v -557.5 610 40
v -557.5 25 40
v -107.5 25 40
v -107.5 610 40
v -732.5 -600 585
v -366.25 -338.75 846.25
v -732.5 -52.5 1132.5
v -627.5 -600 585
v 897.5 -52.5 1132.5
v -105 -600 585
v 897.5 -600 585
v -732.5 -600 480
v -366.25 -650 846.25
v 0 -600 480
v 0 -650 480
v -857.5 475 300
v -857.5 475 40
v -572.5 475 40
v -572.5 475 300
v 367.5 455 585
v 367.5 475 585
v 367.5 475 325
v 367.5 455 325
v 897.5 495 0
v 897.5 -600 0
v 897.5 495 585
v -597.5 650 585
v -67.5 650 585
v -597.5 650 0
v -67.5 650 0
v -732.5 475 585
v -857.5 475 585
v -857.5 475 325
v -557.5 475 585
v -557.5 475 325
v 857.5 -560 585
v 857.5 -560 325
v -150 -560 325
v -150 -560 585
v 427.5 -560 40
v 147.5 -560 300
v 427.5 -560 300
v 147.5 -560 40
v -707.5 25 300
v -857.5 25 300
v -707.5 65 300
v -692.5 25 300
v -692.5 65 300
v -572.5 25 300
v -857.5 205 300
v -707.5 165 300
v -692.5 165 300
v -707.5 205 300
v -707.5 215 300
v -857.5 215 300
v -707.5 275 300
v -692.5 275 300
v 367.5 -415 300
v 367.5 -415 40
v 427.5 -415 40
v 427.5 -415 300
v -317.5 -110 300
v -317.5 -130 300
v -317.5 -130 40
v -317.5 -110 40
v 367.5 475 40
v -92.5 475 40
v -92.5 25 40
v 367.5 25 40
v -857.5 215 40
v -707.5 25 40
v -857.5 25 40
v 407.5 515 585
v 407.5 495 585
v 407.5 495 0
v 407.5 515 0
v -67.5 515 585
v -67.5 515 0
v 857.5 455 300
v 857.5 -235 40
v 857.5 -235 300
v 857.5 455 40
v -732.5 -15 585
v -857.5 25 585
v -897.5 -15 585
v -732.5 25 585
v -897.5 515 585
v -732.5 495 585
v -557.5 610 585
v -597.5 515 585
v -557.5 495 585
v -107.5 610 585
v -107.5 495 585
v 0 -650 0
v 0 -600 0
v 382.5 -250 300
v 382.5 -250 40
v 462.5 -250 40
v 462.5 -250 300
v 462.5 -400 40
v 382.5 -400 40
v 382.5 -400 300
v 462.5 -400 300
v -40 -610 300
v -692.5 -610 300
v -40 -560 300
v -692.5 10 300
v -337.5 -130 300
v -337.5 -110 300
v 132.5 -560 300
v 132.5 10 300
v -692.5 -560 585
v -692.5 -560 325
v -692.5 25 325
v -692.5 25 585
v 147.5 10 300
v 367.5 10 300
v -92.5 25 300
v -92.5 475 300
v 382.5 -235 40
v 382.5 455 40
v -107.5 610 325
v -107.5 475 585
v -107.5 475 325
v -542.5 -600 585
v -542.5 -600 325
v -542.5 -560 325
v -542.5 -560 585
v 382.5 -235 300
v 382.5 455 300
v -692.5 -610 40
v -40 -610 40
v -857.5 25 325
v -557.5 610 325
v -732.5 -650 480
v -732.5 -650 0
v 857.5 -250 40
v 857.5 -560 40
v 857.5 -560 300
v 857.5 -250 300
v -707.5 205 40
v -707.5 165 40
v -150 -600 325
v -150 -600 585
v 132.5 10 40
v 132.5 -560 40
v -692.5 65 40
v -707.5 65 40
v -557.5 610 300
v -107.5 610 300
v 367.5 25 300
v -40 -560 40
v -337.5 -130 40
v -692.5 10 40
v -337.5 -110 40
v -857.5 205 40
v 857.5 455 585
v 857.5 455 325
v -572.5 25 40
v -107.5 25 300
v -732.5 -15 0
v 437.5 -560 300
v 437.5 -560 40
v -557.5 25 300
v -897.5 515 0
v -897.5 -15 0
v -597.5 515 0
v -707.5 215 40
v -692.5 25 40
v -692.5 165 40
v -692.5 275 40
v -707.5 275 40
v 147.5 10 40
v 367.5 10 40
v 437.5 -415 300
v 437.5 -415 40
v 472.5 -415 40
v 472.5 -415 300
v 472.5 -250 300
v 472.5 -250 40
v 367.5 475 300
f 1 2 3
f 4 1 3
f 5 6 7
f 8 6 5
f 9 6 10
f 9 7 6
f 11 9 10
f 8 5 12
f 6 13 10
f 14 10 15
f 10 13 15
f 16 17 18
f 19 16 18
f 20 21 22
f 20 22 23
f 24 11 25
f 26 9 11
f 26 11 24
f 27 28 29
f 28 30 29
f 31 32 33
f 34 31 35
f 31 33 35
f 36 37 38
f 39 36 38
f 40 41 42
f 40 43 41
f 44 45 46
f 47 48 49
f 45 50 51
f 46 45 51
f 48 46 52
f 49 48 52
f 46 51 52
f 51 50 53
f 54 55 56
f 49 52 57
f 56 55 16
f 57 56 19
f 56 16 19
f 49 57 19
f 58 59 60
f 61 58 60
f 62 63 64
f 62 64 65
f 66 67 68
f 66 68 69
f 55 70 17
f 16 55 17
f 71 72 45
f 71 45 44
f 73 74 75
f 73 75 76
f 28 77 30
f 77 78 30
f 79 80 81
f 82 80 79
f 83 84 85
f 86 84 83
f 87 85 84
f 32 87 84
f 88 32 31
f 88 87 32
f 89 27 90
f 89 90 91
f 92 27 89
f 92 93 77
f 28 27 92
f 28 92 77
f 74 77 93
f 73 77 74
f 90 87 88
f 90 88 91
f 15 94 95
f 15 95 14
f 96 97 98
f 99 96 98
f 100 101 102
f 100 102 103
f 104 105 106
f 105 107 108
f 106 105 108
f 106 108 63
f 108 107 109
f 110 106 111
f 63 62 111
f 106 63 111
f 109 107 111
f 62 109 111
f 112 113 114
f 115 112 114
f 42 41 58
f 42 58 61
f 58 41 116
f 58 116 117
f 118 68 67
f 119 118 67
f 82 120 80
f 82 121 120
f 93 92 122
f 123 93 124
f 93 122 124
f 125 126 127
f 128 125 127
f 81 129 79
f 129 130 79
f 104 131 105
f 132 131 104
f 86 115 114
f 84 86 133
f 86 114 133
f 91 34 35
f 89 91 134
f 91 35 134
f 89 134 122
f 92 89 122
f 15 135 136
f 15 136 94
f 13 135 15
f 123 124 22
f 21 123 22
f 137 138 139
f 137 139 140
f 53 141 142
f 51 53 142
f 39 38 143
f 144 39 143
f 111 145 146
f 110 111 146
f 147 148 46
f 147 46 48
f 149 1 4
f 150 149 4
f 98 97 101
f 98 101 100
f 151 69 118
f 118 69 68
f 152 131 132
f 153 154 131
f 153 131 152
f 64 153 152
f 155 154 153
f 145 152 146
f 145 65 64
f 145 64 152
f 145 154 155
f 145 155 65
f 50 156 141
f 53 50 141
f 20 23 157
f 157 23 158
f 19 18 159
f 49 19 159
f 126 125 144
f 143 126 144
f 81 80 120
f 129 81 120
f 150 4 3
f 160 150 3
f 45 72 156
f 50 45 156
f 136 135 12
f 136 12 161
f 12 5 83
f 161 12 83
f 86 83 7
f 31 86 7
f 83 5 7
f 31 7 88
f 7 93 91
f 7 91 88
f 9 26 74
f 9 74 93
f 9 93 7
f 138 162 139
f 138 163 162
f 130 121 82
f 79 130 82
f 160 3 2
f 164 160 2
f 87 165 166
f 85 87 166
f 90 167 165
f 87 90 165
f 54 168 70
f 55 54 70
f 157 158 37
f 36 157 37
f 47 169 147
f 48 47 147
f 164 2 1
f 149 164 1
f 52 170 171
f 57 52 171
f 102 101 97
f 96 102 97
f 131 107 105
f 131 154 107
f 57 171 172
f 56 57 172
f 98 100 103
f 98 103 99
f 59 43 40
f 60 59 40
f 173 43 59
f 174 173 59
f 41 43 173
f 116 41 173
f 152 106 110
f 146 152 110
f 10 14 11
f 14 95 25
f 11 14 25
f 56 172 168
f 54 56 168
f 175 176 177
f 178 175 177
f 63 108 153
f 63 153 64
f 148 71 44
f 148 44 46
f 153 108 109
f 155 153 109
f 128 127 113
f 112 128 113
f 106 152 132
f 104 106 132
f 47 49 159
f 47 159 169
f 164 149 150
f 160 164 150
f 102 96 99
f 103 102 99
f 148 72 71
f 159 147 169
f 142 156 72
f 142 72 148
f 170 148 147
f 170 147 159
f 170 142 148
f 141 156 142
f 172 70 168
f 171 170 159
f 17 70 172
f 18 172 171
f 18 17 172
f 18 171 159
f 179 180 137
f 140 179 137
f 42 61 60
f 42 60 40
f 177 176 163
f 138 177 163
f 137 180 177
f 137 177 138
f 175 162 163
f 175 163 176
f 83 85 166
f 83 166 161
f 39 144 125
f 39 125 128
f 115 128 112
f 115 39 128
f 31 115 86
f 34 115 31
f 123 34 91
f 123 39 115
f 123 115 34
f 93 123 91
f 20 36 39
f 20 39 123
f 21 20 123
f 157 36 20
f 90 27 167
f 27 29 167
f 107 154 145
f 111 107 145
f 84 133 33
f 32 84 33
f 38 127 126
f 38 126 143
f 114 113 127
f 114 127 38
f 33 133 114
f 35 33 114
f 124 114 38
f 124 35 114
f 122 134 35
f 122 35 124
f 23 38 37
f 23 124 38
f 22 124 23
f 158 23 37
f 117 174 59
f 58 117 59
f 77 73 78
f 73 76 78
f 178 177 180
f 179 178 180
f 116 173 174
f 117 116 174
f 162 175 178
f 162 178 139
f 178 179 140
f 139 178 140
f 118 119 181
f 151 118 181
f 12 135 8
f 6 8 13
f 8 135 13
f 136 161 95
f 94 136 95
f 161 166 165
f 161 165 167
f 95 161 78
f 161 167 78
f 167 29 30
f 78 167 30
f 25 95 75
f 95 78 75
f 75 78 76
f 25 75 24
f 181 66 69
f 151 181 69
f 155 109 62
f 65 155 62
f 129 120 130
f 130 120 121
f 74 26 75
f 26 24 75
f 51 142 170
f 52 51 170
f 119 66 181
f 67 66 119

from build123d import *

# Parameters (mm, degrees)
F0_W      = 1795
F0_H      = 1300
F1_DEPTH  = 300
F2_W      = 165
F2_H      = 635
F2_W_2    = 300
F2_H_2    = 135
F2_W_3    = 897.5
F2_H_3    = 50
F2_W_4    = 490
F2_H_4    = 20
F3_DEPTH  = 300
F4_T      = -40
F5_W      = 80
F5_H      = 150
F5_W_2    = 15
F5_H_2    = 40
F5_W_3    = 20
F5_H_3    = 20
F6_DEPTH  = 260
F8_DEPTH  = 25
F10_DEPTH = 50
F12_DEPTH = 260
F14_DEPTH = 400
F16_DEPTH = 1630


with BuildPart() as f1:
    # F0 (on Top) → F1 (new body)
    with BuildSketch(Plane.XY):
        Rectangle(F0_W, F0_H)
    extrude(amount=F1_DEPTH)

    # F2 (on face) → F3 (cut)
    with BuildSketch(Plane(origin=(0, 0, 0), x_dir=(1, 0, 0), z_dir=(0, 0, -1))):
        with Locations((-815, 332.5)):
            Rectangle(F2_W, F2_H)
        with Locations((-747.5, -582.5)):
            Rectangle(F2_W_2, F2_H_2)
        with Locations((448.75, 625)):
            Rectangle(F2_W_3, F2_H_3)
        Polygon((-67.5, -650), (897.5, -650), (897.5, -515), (407.5, -515), (-67.5, -515), align=None)
        with Locations((652.5, -505)):
            Rectangle(F2_W_4, F2_H_4)
    extrude(amount=-F3_DEPTH, mode=Mode.SUBTRACT)

    # F4
    f4_openings = [f1.faces().sort_by_distance(p)[0] for p in [
        (17.505881, -20.736482, 300),
    ]]
    offset(amount=F4_T, openings=f4_openings, kind=Kind.INTERSECTION)

    # F5 (on face) → F6 (join)
    with BuildSketch(Plane.XY.offset(40)):
        Polygon((132.5, 10), (132.5, -560), (147.5, -560), (147.5, 10), (367.5, 10), (367.5, -415), (427.5, -415), (427.5, -560), (437.5, -560), (437.5, -415), (472.5, -415), (472.5, -250), (857.5, -250), (857.5, -235), (382.5, -235), (382.5, 455), (367.5, 455), (367.5, 25), (-92.5, 25), (-92.5, 475), (-107.5, 475), (-107.5, 25), (-557.5, 25), (-557.5, 475), (-572.5, 475), (-572.5, 25), (-692.5, 25), (-692.5, 10), align=None)
        with Locations((422.5, -325)):
            Rectangle(F5_W, F5_H, mode=Mode.SUBTRACT)
        with Locations((-700, 45)):
            Rectangle(F5_W_2, F5_H_2)
        Polygon((-857.5, 215), (-857.5, 205), (-707.5, 205), (-707.5, 165), (-692.5, 165), (-692.5, 205), (-692.5, 215), (-692.5, 275), (-707.5, 275), (-707.5, 215), align=None)
        with Locations((-327.5, -120)):
            Rectangle(F5_W_3, F5_H_3)
    extrude(amount=F6_DEPTH)

    # F7 (on face) → F8 (join)
    with BuildSketch(Plane.XY.offset(300)):
        Polygon((-897.5, -15), (-732.5, -15), (-732.5, -650), (0, -650), (0, -600), (897.5, -600), (897.5, 495), (407.5, 495), (407.5, 515), (-67.5, 515), (-67.5, 650), (-597.5, 650), (-597.5, 515), (-897.5, 515), align=None)
    extrude(amount=F8_DEPTH)

    # F9 (on face) → F10 (join)
    with BuildSketch(Plane.XZ.offset(650)):
        Polygon((-732.5, 480), (-732.5, 325), (0, 325), (0, 480), (-366.25, 846.25), align=None)
    extrude(amount=-F10_DEPTH)

    # F11 (on face) → F12 (join)
    with BuildSketch(Plane.XY.offset(325)):
        Polygon((-897.5, -15), (-732.5, -15), (-732.5, -600), (-692.5, -600), (-542.5, -600), (-542.5, -560), (-692.5, -560), (-692.5, 25), (-857.5, 25), (-857.5, 475), (-557.5, 475), (-557.5, 610), (-107.5, 610), (-107.5, 475), (367.5, 475), (367.5, 455), (857.5, 455), (857.5, -560), (-150, -560), (-150, -600), (0, -600), (897.5, -600), (897.5, 495), (407.5, 495), (407.5, 515), (-67.5, 515), (-67.5, 650), (-597.5, 650), (-597.5, 515), (-897.5, 515), align=None)
    extrude(amount=F12_DEPTH)

    # F13 (on face) → F14 (join)
    with BuildSketch(Plane(origin=(0, -600, 0), x_dir=(-1, 0, 0), z_dir=(0, 1, 0))):
        Polygon((627.5, 585), (366.25, 846.25), (105, 585), align=None)
    extrude(amount=F14_DEPTH)

    # F15 (on face) → F16 (join)
    with BuildSketch(Plane.YZ.offset(897.5)):
        Polygon((-52.5, 1132.5), (-600, 585), (495, 585), align=None)
    extrude(amount=-F16_DEPTH)


solid = f1.part
